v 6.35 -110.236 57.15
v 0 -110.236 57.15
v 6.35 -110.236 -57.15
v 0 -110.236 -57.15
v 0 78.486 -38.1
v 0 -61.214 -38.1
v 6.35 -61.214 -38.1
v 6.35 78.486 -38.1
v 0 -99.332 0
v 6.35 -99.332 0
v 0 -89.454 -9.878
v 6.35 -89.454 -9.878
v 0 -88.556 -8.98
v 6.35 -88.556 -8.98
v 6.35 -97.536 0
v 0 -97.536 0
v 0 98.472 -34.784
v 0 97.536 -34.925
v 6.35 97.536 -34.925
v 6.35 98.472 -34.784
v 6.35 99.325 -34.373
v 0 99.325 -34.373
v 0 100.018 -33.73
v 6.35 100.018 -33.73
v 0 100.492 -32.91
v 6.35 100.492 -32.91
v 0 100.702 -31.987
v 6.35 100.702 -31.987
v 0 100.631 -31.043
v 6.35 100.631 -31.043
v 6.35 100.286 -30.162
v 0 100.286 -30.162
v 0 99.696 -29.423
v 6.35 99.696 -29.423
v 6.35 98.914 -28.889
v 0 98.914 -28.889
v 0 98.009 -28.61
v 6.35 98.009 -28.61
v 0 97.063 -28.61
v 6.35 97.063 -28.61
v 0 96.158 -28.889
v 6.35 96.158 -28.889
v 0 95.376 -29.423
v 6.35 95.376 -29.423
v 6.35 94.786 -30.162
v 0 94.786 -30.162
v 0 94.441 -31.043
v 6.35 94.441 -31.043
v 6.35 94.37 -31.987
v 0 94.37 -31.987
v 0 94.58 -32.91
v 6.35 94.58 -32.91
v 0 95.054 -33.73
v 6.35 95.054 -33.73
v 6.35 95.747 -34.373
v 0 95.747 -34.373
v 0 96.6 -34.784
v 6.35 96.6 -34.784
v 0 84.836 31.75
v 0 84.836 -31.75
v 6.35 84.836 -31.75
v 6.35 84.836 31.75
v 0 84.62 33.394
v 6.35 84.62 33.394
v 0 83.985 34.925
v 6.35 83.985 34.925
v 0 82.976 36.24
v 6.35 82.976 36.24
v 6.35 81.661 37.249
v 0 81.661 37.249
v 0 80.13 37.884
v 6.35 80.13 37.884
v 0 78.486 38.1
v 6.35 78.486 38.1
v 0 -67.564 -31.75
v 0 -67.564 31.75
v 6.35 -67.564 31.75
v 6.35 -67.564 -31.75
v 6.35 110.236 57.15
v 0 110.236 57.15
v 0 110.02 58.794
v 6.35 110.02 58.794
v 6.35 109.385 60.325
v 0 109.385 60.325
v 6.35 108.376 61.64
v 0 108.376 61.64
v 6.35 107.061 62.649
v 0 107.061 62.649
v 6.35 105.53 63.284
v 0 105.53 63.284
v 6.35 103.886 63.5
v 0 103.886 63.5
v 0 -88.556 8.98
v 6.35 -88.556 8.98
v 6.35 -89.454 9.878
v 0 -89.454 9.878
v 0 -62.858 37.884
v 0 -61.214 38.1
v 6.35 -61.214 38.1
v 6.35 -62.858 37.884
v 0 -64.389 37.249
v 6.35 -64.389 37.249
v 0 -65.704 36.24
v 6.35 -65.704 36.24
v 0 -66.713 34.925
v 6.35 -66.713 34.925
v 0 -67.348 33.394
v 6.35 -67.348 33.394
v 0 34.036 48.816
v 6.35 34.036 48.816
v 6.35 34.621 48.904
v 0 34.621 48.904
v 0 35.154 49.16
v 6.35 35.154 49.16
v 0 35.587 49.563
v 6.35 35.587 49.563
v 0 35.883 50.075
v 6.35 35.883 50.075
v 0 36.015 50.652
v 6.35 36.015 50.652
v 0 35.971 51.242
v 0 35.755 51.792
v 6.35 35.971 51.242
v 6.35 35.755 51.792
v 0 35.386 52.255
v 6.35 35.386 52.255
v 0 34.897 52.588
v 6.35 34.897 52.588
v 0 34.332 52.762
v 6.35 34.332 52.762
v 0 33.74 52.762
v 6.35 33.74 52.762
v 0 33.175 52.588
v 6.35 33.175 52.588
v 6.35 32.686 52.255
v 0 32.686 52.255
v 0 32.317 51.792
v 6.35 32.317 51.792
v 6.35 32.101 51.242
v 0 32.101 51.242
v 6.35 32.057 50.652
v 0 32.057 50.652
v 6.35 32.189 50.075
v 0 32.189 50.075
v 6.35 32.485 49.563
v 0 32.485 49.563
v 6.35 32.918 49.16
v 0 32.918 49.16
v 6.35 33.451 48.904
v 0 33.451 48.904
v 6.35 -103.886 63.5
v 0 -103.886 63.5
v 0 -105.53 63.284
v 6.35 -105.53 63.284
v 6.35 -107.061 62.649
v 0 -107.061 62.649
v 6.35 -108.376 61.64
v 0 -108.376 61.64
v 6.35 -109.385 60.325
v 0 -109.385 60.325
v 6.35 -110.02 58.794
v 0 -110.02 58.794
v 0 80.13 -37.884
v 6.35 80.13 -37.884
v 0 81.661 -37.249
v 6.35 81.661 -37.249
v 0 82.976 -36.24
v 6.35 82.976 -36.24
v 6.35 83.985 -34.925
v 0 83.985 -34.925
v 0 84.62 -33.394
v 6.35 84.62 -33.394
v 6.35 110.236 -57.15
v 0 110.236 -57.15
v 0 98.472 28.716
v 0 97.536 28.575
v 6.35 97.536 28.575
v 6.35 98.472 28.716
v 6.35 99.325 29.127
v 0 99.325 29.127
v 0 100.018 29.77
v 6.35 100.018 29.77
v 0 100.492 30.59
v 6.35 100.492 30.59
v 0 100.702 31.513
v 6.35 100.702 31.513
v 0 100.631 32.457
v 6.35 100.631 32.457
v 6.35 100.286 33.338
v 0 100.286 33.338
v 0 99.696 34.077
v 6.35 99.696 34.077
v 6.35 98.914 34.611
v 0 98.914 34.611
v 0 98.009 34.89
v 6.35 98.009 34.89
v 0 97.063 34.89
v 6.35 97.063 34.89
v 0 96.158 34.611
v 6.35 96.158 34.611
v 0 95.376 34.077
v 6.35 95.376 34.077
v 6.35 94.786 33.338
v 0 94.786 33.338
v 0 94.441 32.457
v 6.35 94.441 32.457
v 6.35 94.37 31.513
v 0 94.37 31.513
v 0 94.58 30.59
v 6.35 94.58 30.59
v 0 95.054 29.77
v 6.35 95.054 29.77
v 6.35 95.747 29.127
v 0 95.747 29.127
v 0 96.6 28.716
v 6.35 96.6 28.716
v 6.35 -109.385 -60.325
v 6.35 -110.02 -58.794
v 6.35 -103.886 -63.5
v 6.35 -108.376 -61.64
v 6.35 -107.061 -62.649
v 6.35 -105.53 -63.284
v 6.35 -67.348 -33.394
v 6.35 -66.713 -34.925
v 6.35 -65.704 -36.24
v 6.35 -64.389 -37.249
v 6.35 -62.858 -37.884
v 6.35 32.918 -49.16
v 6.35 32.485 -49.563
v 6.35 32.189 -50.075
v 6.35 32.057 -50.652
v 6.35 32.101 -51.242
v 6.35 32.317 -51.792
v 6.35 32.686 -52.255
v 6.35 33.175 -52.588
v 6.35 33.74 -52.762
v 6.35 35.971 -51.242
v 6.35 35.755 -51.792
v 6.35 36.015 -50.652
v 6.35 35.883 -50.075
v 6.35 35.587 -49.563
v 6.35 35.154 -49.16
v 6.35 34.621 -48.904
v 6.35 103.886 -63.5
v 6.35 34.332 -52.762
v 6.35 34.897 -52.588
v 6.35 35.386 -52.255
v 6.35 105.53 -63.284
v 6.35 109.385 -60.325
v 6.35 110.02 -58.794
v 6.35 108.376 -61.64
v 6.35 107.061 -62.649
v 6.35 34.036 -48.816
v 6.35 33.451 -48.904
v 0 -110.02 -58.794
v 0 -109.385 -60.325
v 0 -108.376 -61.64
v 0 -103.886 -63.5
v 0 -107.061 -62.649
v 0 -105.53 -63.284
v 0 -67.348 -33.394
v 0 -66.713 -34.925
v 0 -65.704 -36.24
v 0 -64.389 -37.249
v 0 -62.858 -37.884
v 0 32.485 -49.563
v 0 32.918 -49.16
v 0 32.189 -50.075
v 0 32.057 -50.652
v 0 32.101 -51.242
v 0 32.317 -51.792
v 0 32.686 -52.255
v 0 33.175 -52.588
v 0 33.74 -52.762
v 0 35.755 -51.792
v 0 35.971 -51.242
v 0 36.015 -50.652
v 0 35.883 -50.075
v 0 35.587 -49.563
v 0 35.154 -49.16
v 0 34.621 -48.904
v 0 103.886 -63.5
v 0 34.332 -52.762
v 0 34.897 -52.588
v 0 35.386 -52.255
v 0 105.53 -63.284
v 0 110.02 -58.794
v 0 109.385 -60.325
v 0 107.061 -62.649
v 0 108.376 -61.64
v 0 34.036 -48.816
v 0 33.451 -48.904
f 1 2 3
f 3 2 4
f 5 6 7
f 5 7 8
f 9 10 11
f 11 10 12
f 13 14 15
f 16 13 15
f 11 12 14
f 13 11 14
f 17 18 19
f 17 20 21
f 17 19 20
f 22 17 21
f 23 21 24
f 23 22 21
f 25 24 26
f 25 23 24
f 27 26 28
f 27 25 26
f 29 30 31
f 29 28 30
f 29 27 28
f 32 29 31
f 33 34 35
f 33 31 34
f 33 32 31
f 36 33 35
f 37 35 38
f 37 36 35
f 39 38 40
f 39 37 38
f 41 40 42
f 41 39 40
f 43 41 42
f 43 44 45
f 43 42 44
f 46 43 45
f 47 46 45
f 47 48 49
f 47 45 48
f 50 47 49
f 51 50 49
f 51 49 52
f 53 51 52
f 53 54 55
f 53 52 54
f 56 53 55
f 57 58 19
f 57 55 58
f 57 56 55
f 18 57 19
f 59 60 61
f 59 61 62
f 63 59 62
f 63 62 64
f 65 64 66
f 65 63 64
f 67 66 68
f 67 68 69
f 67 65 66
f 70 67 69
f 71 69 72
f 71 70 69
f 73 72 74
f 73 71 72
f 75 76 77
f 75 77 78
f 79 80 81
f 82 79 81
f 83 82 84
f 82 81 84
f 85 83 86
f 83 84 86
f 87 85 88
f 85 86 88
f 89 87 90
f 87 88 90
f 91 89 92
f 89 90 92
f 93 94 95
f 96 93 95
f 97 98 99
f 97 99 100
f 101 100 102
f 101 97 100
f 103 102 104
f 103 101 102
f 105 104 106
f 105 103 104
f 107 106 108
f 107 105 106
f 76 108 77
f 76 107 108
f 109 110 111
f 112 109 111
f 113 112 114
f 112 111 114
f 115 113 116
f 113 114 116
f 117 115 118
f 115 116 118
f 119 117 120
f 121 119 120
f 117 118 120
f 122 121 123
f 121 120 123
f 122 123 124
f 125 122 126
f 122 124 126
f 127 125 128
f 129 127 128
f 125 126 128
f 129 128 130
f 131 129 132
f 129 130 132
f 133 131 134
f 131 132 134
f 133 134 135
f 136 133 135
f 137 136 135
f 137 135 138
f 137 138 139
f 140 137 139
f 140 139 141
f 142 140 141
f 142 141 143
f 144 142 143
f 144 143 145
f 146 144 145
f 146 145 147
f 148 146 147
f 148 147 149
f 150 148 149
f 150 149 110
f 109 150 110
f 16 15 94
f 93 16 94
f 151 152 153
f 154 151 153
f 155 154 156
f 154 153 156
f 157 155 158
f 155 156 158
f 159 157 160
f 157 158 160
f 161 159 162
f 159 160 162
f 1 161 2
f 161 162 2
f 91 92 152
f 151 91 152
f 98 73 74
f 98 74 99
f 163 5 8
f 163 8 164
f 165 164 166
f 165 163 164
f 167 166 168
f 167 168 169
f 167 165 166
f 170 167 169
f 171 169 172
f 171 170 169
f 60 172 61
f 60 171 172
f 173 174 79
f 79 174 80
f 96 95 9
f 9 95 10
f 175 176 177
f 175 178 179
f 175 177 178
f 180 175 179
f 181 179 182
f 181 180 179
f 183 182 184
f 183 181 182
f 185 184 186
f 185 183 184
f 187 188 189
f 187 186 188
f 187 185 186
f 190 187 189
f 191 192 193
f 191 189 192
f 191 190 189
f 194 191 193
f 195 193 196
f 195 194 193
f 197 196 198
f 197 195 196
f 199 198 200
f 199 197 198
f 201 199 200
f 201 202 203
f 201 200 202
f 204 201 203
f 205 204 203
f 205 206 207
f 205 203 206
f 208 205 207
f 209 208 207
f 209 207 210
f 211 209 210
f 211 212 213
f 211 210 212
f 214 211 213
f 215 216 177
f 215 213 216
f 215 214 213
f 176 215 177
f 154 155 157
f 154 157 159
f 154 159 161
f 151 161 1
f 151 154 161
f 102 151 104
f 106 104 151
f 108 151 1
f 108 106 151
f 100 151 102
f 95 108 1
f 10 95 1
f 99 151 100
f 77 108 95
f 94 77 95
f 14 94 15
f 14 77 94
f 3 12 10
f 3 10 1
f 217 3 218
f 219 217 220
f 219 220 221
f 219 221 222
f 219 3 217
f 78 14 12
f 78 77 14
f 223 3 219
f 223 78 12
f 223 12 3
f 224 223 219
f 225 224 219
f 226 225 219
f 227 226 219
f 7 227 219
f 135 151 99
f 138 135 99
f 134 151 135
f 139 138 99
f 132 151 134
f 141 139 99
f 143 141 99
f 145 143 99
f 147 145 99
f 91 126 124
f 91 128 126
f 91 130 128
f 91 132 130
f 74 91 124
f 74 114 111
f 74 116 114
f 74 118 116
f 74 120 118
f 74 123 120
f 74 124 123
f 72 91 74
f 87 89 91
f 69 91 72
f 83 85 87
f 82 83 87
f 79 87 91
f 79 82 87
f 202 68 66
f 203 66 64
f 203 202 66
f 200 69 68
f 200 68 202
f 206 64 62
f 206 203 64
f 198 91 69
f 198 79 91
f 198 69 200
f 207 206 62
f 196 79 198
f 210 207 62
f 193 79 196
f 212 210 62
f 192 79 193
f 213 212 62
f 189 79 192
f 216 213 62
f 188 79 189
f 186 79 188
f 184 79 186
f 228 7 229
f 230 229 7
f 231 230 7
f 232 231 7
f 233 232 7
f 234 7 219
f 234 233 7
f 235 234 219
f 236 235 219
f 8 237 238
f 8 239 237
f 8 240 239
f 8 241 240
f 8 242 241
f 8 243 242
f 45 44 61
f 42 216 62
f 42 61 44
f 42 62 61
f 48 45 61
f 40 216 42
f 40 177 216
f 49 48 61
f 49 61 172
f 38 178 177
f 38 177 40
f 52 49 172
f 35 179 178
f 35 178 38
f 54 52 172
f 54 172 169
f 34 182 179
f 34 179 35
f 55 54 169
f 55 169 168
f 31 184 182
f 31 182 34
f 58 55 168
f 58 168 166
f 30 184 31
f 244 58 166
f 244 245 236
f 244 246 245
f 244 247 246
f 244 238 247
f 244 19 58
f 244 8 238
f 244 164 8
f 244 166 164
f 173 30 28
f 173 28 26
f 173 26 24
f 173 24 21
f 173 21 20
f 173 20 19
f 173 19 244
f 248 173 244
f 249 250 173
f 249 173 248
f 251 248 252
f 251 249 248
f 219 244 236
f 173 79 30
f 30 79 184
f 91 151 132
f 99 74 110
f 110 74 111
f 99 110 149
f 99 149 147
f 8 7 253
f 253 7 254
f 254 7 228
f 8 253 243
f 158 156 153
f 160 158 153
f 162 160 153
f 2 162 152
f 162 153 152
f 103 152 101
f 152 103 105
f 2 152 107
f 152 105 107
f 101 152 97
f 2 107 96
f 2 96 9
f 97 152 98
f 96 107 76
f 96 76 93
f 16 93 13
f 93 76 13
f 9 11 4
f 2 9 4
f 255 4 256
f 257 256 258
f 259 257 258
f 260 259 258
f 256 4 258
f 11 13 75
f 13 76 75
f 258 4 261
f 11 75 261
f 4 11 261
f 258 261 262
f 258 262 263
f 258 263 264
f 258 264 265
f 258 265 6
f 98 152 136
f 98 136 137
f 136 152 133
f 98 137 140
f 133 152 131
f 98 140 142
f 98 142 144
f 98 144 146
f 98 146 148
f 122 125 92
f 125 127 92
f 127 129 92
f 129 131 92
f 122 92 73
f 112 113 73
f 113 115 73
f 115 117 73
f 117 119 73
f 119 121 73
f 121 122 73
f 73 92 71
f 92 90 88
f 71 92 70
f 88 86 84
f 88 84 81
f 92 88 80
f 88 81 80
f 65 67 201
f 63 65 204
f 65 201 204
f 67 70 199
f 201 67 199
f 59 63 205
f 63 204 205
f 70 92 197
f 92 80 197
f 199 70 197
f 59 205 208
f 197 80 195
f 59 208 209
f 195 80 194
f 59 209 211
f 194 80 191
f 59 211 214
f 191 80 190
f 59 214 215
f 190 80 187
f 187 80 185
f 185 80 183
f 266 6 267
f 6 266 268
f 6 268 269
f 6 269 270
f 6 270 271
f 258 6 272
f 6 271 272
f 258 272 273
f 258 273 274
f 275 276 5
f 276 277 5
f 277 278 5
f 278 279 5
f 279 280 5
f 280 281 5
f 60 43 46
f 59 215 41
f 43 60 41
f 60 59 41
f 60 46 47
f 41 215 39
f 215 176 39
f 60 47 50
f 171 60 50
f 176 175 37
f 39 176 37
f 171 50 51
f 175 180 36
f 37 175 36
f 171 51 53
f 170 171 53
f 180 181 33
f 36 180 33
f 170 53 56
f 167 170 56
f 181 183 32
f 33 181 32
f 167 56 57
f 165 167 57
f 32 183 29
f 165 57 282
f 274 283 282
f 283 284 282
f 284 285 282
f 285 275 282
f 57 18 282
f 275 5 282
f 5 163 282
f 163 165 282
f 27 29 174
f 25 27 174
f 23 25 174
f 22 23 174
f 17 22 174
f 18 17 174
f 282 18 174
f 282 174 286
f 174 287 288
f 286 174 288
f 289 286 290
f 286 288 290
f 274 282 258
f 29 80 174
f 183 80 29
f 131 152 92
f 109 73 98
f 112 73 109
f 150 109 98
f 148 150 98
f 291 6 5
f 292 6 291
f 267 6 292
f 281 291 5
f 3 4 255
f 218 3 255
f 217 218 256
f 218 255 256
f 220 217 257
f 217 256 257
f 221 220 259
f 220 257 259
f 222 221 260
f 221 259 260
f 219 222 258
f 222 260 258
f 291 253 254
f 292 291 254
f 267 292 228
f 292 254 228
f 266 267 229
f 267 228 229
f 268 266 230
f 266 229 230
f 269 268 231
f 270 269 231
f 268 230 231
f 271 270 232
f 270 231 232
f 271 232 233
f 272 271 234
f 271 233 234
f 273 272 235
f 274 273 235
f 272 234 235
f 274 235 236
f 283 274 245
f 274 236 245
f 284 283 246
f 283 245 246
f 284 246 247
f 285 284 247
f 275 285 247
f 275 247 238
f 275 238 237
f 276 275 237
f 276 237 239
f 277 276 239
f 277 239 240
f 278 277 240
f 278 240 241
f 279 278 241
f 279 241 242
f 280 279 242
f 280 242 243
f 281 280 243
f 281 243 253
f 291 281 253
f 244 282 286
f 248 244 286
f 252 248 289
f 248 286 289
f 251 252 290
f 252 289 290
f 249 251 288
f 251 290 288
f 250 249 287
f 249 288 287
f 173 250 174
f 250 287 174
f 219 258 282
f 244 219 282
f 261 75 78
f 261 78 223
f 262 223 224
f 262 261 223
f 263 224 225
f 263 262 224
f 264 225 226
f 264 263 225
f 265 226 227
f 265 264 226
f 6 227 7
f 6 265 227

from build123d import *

# Parameters (mm, degrees)
BOSS_EXTRUDE2_DEPTH     = 6.35
CUT_EXTRUDE1_REACH      = 129.376
CUT_EXTRUDE2_DEPTH      = 128.37561853
CUT_EXTRUDE2_DEPTH_BACK = 128.37561853
SKETCH5_R               = 3.175
SKETCH6_R               = 1.984375
CUT_EXTRUDE3_DEPTH      = 128.37561853


with BuildPart() as part:
    # Sketch3 → Boss-Extrude2 (new body)
    with BuildSketch(Plane(origin=(0, 0, 0), x_dir=(0, 0, -1), z_dir=(1, 0, 0))):
        with BuildLine():
            Line((-57.15, -110.236), (57.15, -110.236))
            ThreePointArc((57.15, -110.236), (61.640128061, -108.376128061), (63.5, -103.886))
            Line((63.5, -103.886), (63.5, 103.886))
            ThreePointArc((63.5, 103.886), (61.640128061, 108.376128061), (57.15, 110.236))
            Line((57.15, 110.236), (-57.15, 110.236))
            ThreePointArc((-57.15, 110.236), (-61.640128061, 108.376128061), (-63.5, 103.886))
            Line((-63.5, 103.886), (-63.5, -103.886))
            ThreePointArc((-63.5, -103.886), (-61.640128061, -108.376128061), (-57.15, -110.236))
        make_face()
        with BuildLine():
            Line((-31.75, -67.564), (31.75, -67.564))
            ThreePointArc((31.75, -67.564), (36.240128061, -65.704128061), (38.1, -61.214))
            Line((38.1, -61.214), (38.1, 78.486))
            ThreePointArc((38.1, 78.486), (36.240128061, 82.976128061), (31.75, 84.836))
            Line((31.75, 84.836), (-31.75, 84.836))
            ThreePointArc((-31.75, 84.836), (-36.240128061, 82.976128061), (-38.1, 78.486))
            Line((-38.1, 78.486), (-38.1, -61.214))
            ThreePointArc((-38.1, -61.214), (-36.240128061, -65.704128061), (-31.75, -67.564))
        make_face(mode=Mode.SUBTRACT)
    extrude(amount=BOSS_EXTRUDE2_DEPTH)

    # Sketch4 → Cut-Extrude1 (cut, up to next)
    with BuildSketch(Plane(origin=(6.35, 0, 0), x_dir=(0, 0, -1), z_dir=(1, 0, 0)), mode=Mode.PRIVATE) as cut_extrude1_sk1:
        Polygon((0, -97.536), (-8.980256121, -88.555743879), (-9.878281733, -89.453769491), (0, -99.332051224), (9.878281733, -89.453769491), (8.980256121, -88.555743879), align=None)
    cut_extrude1_tool1 = extrude(cut_extrude1_sk1.sketch, amount=-CUT_EXTRUDE1_REACH, mode=Mode.PRIVATE) & part.part
    add(cut_extrude1_tool1.solids().sort_by_distance((6.35, -93.205002, 4.649259))[0], mode=Mode.SUBTRACT)

    # Sketch5 → Cut-Extrude2 (cut, two sides: drawn at the far end of the back side and taken through both)
    with BuildSketch(Plane(origin=(6.35, 0, 0), x_dir=(0, 0, -1), z_dir=(1, 0, 0)).offset(-CUT_EXTRUDE2_DEPTH_BACK)):
        with Locations((-31.75, 97.536)):
            Circle(SKETCH5_R)
        with Locations((31.75, 97.536)):
            Circle(SKETCH5_R)
    extrude(amount=CUT_EXTRUDE2_DEPTH + CUT_EXTRUDE2_DEPTH_BACK, mode=Mode.SUBTRACT)

    # Sketch6 → Cut-Extrude3 (cut, through all)
    with BuildSketch(Plane(origin=(6.35, 0, 0), x_dir=(0, 0, -1), z_dir=(1, 0, 0))):
        with Locations((-50.8, 34.036)):
            Circle(SKETCH6_R)
        with Locations(Location((50.8, 34.036, 0), (0, 0, 180))):
            Circle(SKETCH6_R)
    extrude(amount=-CUT_EXTRUDE3_DEPTH, mode=Mode.SUBTRACT)


solid = part.part
